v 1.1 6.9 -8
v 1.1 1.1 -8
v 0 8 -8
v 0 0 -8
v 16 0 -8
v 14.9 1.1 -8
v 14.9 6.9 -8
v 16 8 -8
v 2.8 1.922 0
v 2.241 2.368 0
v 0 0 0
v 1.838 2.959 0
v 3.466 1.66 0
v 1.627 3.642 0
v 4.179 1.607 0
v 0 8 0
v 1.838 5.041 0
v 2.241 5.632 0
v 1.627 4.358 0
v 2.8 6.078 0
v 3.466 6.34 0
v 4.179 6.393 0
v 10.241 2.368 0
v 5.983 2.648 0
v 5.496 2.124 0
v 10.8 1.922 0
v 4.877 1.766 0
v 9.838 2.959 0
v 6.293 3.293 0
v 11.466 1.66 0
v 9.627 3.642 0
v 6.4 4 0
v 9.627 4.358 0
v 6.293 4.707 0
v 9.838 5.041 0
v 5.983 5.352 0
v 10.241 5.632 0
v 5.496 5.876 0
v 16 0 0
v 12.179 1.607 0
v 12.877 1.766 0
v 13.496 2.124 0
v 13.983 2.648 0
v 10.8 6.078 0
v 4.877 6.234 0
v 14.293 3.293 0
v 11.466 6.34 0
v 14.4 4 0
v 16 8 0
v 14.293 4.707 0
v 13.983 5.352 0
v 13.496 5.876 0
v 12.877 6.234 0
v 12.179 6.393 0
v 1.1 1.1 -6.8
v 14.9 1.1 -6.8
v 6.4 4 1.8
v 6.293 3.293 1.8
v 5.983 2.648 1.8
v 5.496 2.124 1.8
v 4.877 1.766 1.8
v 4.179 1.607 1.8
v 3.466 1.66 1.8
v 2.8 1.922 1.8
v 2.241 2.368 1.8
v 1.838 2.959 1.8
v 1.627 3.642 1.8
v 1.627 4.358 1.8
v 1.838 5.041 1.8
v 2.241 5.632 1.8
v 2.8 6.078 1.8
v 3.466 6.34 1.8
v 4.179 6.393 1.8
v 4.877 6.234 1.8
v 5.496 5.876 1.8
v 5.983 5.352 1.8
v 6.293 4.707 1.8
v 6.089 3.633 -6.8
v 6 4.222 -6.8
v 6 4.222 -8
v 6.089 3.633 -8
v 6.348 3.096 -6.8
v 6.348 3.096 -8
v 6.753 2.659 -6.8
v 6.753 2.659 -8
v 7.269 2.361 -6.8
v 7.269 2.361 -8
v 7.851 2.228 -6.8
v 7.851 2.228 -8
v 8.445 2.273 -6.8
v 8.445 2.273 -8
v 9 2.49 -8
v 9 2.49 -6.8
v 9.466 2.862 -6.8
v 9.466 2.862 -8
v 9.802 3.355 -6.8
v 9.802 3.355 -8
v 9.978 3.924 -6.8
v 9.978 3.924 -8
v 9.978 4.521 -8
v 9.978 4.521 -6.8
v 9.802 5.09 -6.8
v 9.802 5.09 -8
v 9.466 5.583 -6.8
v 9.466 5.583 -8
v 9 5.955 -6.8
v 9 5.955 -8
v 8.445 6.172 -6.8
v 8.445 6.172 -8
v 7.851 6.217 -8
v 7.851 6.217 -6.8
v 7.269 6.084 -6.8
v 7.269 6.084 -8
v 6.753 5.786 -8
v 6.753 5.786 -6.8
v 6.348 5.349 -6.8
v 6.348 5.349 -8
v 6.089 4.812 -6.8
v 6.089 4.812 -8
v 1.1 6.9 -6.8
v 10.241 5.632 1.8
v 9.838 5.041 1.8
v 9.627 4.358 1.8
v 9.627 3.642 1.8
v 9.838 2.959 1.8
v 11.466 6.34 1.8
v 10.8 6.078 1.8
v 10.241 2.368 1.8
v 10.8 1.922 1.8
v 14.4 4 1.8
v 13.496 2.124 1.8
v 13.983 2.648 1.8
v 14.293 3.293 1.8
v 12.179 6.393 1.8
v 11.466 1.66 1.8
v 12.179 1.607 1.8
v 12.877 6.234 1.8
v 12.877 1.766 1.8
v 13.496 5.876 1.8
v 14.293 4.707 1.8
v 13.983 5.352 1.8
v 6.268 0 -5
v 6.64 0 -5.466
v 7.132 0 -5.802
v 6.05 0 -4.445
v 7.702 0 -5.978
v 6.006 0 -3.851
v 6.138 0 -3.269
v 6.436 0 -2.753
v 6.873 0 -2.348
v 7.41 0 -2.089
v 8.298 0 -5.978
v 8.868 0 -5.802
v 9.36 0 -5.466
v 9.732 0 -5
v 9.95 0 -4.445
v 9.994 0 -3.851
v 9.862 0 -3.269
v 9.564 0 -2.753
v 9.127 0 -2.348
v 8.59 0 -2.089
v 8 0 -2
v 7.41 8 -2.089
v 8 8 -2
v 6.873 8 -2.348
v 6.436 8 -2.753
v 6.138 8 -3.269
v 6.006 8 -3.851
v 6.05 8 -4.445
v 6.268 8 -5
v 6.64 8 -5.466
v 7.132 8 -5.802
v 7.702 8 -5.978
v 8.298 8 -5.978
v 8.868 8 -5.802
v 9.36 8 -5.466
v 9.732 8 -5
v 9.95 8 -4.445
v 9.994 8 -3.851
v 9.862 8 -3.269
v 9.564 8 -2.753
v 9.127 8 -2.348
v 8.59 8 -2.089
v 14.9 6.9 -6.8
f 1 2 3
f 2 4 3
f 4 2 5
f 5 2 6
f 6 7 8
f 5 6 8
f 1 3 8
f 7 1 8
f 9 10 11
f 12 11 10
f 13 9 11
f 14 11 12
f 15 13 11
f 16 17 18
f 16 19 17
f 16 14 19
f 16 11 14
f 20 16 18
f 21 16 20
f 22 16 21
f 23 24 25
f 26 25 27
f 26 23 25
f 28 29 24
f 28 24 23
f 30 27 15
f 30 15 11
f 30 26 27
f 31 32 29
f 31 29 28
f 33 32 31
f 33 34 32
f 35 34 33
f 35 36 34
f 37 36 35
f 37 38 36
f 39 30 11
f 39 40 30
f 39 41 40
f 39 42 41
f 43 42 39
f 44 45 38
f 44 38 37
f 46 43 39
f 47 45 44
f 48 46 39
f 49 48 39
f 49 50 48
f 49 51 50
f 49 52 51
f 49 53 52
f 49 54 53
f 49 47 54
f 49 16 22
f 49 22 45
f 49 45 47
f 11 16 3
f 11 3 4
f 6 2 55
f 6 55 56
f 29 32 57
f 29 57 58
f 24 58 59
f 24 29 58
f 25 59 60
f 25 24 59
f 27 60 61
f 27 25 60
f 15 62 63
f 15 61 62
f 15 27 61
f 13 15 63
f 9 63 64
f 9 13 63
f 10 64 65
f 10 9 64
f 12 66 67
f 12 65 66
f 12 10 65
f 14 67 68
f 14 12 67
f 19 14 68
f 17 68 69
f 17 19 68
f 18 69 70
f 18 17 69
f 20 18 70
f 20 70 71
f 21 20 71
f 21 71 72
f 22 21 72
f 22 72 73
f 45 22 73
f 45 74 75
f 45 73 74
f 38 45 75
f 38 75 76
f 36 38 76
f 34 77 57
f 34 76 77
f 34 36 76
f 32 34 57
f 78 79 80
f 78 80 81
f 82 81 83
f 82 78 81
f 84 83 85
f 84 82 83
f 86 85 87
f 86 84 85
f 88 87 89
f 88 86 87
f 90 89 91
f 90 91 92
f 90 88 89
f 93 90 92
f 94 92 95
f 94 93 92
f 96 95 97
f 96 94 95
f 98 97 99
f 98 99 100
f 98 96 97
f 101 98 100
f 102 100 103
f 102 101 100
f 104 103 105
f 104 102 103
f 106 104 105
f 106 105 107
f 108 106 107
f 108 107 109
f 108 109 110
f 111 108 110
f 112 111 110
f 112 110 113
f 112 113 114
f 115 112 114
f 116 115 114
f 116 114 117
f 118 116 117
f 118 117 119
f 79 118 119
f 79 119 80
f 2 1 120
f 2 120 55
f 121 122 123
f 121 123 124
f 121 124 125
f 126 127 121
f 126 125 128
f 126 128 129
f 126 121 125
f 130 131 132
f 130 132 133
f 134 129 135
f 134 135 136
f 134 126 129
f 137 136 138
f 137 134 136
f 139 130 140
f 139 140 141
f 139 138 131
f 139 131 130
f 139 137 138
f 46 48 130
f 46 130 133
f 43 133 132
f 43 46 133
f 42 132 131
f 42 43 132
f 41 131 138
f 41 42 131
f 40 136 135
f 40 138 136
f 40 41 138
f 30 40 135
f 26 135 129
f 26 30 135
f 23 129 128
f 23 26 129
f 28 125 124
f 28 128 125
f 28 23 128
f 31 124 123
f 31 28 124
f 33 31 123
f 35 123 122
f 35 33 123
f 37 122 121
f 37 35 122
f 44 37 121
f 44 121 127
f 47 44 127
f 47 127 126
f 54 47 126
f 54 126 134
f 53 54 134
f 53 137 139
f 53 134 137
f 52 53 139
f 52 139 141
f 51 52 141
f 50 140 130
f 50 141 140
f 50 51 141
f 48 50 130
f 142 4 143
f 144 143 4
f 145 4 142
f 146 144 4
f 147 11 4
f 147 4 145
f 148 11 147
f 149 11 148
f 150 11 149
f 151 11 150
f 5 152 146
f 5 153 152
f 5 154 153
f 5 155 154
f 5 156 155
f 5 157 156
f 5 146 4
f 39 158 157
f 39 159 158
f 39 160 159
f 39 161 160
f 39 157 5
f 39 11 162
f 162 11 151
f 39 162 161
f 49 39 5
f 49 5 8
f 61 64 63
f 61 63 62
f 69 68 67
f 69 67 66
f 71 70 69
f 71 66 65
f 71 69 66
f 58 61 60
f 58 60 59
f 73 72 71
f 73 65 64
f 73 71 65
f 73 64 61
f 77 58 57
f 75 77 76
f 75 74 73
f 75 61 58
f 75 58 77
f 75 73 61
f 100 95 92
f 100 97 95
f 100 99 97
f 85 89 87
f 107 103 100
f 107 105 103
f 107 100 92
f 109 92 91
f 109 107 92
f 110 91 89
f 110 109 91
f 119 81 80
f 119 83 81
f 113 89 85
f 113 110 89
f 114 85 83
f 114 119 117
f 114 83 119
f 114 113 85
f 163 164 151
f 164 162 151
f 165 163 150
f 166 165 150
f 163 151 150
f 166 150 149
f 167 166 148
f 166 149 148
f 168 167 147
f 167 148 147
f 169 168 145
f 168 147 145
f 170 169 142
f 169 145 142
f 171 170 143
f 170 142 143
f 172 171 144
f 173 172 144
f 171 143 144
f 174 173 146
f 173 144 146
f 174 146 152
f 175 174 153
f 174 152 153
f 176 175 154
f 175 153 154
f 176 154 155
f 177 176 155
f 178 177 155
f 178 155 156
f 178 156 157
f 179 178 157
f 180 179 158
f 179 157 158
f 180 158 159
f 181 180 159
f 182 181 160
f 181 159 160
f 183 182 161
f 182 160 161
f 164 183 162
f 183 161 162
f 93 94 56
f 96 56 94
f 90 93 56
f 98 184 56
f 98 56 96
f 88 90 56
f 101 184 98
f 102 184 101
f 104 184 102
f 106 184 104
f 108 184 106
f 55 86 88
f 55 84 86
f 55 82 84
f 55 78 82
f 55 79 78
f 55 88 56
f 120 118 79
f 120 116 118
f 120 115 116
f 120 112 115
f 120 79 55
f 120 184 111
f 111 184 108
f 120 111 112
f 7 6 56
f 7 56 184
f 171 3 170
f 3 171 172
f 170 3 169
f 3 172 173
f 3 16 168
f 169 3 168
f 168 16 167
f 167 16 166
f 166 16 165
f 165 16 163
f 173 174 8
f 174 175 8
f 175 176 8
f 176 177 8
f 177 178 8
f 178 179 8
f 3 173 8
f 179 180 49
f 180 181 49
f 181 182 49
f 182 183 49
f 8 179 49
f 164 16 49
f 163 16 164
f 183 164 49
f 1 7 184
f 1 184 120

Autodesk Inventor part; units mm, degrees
ref_plane "YZ Plane" through (0, 0, 0) normal (1, 0, 0) x (0, 1, 0)
ref_plane "XZ Plane" through (0, 0, 0) normal (0, 1, 0) x (-1, 0, 0)
sketch "Top" plane through (0, 0, 0) normal (0, 0, 1) x (1, 0, 0)
  line L0 (0, 8) -> (0, 0)
  line L1 (0, 0) -> (16, 0)
  line L2 (16, 0) -> (16, 8)
  line L3 (0, 8) -> (16, 8)
  point P0 (8, 0)
  dimension "d0" = 16
  dimension "d1" = 8
  dimension "d2" = 8
extrude "Extrusion5" add sketch "Top" against normal blind 8
sketch "Sketch4" plane through (0, 0, 0) normal (0, 0, 1) x (1, 0, 0)
  line L0 (0, 0) -> (0, 8) projected
  line L1 (16, 8) -> (16, 0) projected
  line L2 (0, 8) -> (16, 8)
  line L3 (16, 8) -> (16, 0)
  line L4 (16, 0) -> (0, 0)
  line L5 (0, 0) -> (0, 8)
  circle A0 centre (4, 4) radius 2.4
  circle A1 centre (12, 4) radius 2.4
  dimension "d29" = 4.8
  dimension "d30" = 4.8
  dimension "d31" = 4
  dimension "d32" = 4
  dimension "d33" = 8
  dimension "d34" = 4
extrude "Extrusion6" add sketch "Sketch4" along normal blind 1.8 contours A0 | A1
sketch "Sketch5" plane through (0, 0, -8) normal (0, 0, -1) x (-1, 0, 0)
  line L0 (-14.9, 6.9) -> (-1.1, 6.9)
  line L1 (-1.1, 6.9) -> (-1.1, 1.1)
  line L2 (-1.1, 1.1) -> (-14.9, 1.1)
  line L3 (-14.9, 1.1) -> (-14.9, 6.9)
  line L4 (0, 8) -> (-16, 8) projected
  line L5 (-16, 8) -> (-16, 0) projected
  line L6 (-16, 0) -> (0, 0) projected
  line L7 (0, 0) -> (0, 8) projected
  dimension "d37" = 1.1
  dimension "d38" = 1.1
  dimension "d39" = 1.1
  dimension "d40" = 1.1
extrude "Extrusion7" cut sketch "Sketch5" against normal blind 1.2 contours L0 L1 L2 L3
sketch "Sketch6" plane through (0, 0, -6.8) normal (0, 0, -1) x (-1, 0, 0)
  line L0 (-14.9, 1.1) -> (-14.9, 6.9) projected
  line L1 (-14.9, 4.2225) -> (-1.1, 4.2225)
  line L2 (-1.1, 6.9) -> (-1.1, 1.1) projected
  circle A0 centre (-8, 4.2225) radius 2
  line L3 (-16, 8) -> (-16, 0) projected
  line L4 (-1.1, 1.1) -> (-14.9, 1.1) projected
  point P0 (0, 0)
  dimension "d43" = 8
  dimension "d44" = 4
  dimension "d45" = 3.1225
extrude "Extrusion8" add sketch "Sketch6" along normal blind 1.2 contours A0 L1 | L1 A0
sketch "Sketch8" plane through (0, 8, 0) normal (0, 1, 0) x (1, 0, 0)
  line L0 (16, 0) -> (16, 8) projected
  line L1 (16, 4) -> (0, 4)
  line L2 (0, 0) -> (0, 8) projected
  point P0 (8, 4)
hole "Hole2" at (8, 8, -4) direction (0, -1, 0) diameter 4 depth 8 tip angle 118
properties part number "bricks"
